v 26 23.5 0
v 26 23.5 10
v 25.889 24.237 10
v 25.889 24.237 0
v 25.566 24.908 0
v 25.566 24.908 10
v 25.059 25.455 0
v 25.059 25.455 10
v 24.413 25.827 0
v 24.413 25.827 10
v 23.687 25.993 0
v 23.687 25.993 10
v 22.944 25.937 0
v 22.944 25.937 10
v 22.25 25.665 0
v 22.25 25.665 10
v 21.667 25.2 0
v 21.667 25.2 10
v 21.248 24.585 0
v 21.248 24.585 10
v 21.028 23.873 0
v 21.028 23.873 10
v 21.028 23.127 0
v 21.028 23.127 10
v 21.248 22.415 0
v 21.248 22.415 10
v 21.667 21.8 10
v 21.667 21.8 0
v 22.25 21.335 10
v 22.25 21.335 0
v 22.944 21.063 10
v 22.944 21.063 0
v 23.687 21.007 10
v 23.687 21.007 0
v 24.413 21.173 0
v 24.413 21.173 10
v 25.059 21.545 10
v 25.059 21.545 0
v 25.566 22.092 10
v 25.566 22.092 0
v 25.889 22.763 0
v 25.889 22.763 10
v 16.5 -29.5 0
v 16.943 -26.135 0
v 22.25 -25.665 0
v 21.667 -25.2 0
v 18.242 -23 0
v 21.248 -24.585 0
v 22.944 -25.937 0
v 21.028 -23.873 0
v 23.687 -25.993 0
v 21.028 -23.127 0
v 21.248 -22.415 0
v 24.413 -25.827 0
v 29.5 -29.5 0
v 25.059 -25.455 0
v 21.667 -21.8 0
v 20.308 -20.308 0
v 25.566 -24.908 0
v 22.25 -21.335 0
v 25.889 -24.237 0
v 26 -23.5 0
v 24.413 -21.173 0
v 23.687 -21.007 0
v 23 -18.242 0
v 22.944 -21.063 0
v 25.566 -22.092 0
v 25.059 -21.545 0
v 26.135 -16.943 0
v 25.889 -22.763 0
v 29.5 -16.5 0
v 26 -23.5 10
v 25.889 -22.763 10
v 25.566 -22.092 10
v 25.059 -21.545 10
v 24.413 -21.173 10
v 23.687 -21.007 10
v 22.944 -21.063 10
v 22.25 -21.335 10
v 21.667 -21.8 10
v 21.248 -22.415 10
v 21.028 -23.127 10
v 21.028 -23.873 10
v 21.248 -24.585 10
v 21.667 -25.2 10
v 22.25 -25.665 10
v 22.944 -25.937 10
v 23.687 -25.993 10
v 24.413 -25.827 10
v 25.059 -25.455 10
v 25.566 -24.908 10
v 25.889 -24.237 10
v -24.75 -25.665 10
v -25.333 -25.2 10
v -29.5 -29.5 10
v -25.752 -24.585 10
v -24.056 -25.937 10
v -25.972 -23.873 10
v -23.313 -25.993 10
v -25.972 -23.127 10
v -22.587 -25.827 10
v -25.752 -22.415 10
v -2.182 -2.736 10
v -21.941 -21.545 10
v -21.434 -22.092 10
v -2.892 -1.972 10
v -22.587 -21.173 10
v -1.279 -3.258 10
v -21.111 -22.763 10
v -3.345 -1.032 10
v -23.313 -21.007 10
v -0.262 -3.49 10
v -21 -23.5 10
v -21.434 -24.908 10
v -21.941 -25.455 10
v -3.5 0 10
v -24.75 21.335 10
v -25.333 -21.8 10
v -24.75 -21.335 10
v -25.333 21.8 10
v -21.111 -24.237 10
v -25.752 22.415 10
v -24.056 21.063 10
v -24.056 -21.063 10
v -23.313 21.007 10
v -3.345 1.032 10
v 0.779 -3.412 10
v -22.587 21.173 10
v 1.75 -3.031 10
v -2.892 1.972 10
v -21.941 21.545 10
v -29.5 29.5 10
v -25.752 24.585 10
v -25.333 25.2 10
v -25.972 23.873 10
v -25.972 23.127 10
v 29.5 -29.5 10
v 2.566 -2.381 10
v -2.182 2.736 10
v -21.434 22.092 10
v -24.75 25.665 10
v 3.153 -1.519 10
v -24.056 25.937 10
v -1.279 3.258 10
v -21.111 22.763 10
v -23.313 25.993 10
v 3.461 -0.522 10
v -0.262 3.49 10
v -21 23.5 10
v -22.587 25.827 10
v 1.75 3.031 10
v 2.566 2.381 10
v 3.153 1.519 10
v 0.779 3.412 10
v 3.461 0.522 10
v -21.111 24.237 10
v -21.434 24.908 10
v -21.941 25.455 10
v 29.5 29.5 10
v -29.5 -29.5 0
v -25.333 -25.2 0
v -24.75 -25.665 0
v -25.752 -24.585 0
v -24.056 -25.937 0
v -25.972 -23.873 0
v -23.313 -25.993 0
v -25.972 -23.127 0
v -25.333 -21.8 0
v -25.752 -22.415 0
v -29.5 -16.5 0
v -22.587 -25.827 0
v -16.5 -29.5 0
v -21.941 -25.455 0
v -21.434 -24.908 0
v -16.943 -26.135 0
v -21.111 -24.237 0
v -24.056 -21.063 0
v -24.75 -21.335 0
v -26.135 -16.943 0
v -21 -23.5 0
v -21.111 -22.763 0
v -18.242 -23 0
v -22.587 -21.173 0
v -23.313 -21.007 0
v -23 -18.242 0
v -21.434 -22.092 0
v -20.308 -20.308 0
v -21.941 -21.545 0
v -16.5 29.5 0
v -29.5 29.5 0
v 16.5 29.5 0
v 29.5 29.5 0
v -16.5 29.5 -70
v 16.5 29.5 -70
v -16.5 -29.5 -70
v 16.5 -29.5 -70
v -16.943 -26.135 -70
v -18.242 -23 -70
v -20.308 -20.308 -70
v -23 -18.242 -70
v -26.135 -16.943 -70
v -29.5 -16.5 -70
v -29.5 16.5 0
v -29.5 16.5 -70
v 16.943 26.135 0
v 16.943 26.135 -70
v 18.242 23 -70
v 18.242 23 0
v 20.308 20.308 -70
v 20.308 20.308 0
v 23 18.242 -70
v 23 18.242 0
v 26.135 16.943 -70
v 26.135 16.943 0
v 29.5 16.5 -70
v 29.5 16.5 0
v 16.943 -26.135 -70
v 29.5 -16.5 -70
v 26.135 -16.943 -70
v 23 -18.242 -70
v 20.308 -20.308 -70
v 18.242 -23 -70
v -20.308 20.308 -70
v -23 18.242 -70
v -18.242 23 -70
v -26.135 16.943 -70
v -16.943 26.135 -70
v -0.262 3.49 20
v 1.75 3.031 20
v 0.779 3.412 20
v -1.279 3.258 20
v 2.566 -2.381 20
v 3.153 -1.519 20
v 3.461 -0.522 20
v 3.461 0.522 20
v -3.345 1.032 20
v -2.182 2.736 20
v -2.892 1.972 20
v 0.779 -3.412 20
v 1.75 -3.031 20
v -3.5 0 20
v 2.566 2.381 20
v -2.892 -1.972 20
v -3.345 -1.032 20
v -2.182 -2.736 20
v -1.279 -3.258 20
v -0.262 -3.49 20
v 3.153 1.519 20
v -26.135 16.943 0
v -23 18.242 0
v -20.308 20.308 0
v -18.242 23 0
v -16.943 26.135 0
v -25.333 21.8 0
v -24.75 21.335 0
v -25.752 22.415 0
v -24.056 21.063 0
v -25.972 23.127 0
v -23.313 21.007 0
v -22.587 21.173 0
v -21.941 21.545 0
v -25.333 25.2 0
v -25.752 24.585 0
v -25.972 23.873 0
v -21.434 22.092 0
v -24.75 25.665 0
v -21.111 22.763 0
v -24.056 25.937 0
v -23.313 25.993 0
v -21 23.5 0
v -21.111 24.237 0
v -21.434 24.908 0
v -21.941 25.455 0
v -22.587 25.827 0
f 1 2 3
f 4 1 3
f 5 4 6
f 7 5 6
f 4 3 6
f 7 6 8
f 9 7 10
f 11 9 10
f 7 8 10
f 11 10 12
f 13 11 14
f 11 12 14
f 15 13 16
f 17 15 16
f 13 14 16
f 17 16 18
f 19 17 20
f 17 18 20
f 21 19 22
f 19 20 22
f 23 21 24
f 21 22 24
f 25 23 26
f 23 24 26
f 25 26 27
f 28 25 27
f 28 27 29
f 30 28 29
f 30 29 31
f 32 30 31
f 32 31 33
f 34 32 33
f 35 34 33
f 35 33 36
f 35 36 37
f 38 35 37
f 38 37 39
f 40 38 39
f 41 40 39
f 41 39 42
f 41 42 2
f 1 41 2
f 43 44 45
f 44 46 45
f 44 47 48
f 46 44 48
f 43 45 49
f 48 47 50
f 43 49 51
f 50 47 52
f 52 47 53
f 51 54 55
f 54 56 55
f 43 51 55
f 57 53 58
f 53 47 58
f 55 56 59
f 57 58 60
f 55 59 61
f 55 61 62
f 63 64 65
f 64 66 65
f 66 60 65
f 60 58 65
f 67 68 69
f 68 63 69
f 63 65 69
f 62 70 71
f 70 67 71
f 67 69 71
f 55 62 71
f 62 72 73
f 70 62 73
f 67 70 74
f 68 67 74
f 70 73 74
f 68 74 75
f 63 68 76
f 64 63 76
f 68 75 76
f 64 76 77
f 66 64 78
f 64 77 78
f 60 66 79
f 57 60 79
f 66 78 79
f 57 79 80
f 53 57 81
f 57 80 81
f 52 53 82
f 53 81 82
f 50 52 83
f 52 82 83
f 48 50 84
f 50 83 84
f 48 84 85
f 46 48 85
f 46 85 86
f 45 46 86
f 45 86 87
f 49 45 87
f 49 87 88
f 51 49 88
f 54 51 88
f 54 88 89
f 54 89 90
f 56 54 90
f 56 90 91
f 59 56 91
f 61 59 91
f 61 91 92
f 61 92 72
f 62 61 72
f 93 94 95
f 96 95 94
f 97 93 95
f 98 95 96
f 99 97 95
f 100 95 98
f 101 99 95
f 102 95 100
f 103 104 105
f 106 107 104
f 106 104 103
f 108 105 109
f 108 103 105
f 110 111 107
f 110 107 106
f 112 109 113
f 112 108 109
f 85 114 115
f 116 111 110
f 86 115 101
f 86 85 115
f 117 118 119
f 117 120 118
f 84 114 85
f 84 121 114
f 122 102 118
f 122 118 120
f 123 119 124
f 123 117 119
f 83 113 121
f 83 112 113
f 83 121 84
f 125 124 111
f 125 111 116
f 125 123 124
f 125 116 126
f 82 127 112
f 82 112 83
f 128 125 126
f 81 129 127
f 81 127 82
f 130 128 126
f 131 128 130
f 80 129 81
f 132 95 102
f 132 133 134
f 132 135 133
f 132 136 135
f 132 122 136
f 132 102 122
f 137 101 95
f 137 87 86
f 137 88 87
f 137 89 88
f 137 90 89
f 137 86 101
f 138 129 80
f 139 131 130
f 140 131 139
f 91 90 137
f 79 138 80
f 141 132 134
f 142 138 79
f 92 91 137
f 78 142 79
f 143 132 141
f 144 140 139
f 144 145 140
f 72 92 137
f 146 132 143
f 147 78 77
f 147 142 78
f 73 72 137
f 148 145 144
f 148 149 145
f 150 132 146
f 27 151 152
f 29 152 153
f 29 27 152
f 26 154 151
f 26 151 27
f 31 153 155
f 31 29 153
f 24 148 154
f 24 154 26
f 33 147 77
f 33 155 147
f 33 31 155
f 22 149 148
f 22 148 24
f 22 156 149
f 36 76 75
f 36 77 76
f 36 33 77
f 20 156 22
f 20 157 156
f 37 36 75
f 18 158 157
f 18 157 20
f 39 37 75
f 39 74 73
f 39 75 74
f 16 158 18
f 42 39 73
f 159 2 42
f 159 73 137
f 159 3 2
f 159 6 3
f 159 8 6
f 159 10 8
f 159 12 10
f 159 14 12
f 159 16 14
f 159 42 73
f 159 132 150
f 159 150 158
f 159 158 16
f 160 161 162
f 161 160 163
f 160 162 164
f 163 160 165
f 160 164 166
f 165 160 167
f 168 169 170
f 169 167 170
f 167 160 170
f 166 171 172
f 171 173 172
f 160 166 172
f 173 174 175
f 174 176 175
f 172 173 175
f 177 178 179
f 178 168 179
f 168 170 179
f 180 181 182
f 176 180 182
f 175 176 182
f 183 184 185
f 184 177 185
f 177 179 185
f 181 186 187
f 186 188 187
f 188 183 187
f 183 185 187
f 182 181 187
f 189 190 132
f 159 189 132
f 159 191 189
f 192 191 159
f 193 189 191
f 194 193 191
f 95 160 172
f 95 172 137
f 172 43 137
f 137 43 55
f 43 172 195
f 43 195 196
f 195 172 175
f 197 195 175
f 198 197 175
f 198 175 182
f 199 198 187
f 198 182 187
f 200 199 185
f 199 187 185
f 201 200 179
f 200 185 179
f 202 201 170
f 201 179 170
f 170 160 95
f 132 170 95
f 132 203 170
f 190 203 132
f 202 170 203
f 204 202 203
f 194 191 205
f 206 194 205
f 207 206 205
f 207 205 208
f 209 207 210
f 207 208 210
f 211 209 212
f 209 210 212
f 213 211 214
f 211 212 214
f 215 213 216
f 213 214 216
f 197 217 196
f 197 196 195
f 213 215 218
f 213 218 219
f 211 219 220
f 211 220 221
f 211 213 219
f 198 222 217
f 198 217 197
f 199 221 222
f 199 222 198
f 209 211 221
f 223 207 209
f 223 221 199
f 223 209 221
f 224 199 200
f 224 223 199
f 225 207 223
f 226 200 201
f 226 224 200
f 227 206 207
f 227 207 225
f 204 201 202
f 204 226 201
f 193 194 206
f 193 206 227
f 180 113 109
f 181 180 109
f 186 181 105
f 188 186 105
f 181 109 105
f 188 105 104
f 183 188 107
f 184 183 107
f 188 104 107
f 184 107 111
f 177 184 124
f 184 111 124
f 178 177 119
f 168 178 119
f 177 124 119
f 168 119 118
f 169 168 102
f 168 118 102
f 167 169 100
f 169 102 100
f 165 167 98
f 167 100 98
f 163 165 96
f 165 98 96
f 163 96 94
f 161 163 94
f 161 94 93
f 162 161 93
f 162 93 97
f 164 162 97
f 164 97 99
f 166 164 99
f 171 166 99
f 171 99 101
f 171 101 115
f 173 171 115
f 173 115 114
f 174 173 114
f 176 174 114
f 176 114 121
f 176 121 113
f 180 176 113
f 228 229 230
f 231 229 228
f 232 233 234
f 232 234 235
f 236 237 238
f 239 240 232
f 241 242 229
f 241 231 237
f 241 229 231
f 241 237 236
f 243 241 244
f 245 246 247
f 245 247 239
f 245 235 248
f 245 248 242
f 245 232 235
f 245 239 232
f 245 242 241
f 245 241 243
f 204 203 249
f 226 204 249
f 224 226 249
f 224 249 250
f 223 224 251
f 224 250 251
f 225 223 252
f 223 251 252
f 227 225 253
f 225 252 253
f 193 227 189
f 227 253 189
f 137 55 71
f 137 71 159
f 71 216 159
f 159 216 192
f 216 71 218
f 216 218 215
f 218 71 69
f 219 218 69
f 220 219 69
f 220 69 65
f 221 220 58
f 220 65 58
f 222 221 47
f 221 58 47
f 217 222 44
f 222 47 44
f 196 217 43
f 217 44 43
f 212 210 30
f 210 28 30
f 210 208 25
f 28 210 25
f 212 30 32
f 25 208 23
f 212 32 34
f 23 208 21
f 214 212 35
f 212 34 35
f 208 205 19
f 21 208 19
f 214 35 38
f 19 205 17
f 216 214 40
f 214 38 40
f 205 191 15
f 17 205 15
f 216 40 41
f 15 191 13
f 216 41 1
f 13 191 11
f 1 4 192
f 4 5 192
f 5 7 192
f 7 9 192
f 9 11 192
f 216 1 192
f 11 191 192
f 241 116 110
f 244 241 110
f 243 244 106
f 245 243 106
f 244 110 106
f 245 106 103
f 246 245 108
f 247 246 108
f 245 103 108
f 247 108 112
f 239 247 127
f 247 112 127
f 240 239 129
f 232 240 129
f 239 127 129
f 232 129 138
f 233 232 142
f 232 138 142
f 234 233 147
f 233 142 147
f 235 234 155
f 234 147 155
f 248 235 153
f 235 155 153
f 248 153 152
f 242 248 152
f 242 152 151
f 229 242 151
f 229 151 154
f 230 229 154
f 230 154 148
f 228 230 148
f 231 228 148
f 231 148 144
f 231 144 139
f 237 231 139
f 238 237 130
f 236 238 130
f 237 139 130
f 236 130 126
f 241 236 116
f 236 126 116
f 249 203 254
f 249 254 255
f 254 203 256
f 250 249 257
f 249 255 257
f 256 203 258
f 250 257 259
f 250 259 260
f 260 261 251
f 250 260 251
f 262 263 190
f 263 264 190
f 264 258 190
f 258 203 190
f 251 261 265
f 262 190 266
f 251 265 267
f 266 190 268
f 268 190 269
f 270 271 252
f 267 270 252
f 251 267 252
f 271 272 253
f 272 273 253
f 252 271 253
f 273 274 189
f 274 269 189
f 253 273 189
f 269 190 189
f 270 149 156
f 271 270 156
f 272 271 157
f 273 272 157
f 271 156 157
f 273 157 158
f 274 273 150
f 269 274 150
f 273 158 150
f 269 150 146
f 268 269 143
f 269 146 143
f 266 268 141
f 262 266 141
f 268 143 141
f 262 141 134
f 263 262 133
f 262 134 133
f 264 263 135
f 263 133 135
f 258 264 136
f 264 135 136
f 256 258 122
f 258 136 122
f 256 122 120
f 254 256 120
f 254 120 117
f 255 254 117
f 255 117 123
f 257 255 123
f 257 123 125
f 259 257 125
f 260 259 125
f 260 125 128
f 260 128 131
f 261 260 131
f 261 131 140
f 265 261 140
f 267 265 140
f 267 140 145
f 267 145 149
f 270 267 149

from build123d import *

# Parameters (mm, degrees)
SKETCH1_W           = 59
SKETCH1_H           = 59
BOSS_EXTRUDE1_DEPTH = 10
SKETCH2_R           = 2.5
CUT_EXTRUDE2_DEPTH  = 43.901048938
SKETCH4_R           = 3.5
BOSS_EXTRUDE2_DEPTH = 10
BOSS_EXTRUDE3_DEPTH = 70


with BuildPart() as part:
    # Sketch1 → Boss-Extrude1 (new body)
    with BuildSketch(Plane.XY):
        Rectangle(SKETCH1_W, SKETCH1_H)
    extrude(amount=BOSS_EXTRUDE1_DEPTH)

    # Sketch2 → Cut-Extrude2 (cut, through all)
    with BuildSketch(Plane.XY.offset(10)):
        with Locations((23.5, 23.5)):
            Circle(SKETCH2_R)
        with Locations((23.5, -23.5)):
            Circle(SKETCH2_R)
        with Locations((-23.5, -23.5)):
            Circle(SKETCH2_R)
        with Locations((-23.5, 23.5)):
            Circle(SKETCH2_R)
    extrude(amount=-CUT_EXTRUDE2_DEPTH, mode=Mode.SUBTRACT)

    # Sketch4 → Boss-Extrude2 (add)
    with BuildSketch(Plane.XY.offset(10)):
        with Locations(Location((0, 0, 0), (0, 0, 180))):
            Circle(SKETCH4_R)
    extrude(amount=BOSS_EXTRUDE2_DEPTH)

    # Sketch5 → Boss-Extrude3 (add)
    with BuildSketch(Plane(origin=(0, 0, 0), x_dir=(-1, 0, 0), z_dir=(0, 0, -1))):
        with BuildLine():
            Line((-29.5, 16.5), (-29.5, -16.5))
            ThreePointArc((-29.5, -16.5), (-20.307611845, -20.307611845), (-16.5, -29.5))
            Line((-16.5, -29.5), (16.5, -29.5))
            ThreePointArc((16.5, -29.5), (20.307611845, -20.307611845), (29.5, -16.5))
            Line((29.5, -16.5), (29.5, 16.5))
            ThreePointArc((29.5, 16.5), (20.307611845, 20.307611845), (16.5, 29.5))
            Line((16.5, 29.5), (-16.5, 29.5))
            ThreePointArc((-16.5, 29.5), (-20.307611845, 20.307611845), (-29.5, 16.5))
        make_face()
    extrude(amount=BOSS_EXTRUDE3_DEPTH)


solid = part.part
